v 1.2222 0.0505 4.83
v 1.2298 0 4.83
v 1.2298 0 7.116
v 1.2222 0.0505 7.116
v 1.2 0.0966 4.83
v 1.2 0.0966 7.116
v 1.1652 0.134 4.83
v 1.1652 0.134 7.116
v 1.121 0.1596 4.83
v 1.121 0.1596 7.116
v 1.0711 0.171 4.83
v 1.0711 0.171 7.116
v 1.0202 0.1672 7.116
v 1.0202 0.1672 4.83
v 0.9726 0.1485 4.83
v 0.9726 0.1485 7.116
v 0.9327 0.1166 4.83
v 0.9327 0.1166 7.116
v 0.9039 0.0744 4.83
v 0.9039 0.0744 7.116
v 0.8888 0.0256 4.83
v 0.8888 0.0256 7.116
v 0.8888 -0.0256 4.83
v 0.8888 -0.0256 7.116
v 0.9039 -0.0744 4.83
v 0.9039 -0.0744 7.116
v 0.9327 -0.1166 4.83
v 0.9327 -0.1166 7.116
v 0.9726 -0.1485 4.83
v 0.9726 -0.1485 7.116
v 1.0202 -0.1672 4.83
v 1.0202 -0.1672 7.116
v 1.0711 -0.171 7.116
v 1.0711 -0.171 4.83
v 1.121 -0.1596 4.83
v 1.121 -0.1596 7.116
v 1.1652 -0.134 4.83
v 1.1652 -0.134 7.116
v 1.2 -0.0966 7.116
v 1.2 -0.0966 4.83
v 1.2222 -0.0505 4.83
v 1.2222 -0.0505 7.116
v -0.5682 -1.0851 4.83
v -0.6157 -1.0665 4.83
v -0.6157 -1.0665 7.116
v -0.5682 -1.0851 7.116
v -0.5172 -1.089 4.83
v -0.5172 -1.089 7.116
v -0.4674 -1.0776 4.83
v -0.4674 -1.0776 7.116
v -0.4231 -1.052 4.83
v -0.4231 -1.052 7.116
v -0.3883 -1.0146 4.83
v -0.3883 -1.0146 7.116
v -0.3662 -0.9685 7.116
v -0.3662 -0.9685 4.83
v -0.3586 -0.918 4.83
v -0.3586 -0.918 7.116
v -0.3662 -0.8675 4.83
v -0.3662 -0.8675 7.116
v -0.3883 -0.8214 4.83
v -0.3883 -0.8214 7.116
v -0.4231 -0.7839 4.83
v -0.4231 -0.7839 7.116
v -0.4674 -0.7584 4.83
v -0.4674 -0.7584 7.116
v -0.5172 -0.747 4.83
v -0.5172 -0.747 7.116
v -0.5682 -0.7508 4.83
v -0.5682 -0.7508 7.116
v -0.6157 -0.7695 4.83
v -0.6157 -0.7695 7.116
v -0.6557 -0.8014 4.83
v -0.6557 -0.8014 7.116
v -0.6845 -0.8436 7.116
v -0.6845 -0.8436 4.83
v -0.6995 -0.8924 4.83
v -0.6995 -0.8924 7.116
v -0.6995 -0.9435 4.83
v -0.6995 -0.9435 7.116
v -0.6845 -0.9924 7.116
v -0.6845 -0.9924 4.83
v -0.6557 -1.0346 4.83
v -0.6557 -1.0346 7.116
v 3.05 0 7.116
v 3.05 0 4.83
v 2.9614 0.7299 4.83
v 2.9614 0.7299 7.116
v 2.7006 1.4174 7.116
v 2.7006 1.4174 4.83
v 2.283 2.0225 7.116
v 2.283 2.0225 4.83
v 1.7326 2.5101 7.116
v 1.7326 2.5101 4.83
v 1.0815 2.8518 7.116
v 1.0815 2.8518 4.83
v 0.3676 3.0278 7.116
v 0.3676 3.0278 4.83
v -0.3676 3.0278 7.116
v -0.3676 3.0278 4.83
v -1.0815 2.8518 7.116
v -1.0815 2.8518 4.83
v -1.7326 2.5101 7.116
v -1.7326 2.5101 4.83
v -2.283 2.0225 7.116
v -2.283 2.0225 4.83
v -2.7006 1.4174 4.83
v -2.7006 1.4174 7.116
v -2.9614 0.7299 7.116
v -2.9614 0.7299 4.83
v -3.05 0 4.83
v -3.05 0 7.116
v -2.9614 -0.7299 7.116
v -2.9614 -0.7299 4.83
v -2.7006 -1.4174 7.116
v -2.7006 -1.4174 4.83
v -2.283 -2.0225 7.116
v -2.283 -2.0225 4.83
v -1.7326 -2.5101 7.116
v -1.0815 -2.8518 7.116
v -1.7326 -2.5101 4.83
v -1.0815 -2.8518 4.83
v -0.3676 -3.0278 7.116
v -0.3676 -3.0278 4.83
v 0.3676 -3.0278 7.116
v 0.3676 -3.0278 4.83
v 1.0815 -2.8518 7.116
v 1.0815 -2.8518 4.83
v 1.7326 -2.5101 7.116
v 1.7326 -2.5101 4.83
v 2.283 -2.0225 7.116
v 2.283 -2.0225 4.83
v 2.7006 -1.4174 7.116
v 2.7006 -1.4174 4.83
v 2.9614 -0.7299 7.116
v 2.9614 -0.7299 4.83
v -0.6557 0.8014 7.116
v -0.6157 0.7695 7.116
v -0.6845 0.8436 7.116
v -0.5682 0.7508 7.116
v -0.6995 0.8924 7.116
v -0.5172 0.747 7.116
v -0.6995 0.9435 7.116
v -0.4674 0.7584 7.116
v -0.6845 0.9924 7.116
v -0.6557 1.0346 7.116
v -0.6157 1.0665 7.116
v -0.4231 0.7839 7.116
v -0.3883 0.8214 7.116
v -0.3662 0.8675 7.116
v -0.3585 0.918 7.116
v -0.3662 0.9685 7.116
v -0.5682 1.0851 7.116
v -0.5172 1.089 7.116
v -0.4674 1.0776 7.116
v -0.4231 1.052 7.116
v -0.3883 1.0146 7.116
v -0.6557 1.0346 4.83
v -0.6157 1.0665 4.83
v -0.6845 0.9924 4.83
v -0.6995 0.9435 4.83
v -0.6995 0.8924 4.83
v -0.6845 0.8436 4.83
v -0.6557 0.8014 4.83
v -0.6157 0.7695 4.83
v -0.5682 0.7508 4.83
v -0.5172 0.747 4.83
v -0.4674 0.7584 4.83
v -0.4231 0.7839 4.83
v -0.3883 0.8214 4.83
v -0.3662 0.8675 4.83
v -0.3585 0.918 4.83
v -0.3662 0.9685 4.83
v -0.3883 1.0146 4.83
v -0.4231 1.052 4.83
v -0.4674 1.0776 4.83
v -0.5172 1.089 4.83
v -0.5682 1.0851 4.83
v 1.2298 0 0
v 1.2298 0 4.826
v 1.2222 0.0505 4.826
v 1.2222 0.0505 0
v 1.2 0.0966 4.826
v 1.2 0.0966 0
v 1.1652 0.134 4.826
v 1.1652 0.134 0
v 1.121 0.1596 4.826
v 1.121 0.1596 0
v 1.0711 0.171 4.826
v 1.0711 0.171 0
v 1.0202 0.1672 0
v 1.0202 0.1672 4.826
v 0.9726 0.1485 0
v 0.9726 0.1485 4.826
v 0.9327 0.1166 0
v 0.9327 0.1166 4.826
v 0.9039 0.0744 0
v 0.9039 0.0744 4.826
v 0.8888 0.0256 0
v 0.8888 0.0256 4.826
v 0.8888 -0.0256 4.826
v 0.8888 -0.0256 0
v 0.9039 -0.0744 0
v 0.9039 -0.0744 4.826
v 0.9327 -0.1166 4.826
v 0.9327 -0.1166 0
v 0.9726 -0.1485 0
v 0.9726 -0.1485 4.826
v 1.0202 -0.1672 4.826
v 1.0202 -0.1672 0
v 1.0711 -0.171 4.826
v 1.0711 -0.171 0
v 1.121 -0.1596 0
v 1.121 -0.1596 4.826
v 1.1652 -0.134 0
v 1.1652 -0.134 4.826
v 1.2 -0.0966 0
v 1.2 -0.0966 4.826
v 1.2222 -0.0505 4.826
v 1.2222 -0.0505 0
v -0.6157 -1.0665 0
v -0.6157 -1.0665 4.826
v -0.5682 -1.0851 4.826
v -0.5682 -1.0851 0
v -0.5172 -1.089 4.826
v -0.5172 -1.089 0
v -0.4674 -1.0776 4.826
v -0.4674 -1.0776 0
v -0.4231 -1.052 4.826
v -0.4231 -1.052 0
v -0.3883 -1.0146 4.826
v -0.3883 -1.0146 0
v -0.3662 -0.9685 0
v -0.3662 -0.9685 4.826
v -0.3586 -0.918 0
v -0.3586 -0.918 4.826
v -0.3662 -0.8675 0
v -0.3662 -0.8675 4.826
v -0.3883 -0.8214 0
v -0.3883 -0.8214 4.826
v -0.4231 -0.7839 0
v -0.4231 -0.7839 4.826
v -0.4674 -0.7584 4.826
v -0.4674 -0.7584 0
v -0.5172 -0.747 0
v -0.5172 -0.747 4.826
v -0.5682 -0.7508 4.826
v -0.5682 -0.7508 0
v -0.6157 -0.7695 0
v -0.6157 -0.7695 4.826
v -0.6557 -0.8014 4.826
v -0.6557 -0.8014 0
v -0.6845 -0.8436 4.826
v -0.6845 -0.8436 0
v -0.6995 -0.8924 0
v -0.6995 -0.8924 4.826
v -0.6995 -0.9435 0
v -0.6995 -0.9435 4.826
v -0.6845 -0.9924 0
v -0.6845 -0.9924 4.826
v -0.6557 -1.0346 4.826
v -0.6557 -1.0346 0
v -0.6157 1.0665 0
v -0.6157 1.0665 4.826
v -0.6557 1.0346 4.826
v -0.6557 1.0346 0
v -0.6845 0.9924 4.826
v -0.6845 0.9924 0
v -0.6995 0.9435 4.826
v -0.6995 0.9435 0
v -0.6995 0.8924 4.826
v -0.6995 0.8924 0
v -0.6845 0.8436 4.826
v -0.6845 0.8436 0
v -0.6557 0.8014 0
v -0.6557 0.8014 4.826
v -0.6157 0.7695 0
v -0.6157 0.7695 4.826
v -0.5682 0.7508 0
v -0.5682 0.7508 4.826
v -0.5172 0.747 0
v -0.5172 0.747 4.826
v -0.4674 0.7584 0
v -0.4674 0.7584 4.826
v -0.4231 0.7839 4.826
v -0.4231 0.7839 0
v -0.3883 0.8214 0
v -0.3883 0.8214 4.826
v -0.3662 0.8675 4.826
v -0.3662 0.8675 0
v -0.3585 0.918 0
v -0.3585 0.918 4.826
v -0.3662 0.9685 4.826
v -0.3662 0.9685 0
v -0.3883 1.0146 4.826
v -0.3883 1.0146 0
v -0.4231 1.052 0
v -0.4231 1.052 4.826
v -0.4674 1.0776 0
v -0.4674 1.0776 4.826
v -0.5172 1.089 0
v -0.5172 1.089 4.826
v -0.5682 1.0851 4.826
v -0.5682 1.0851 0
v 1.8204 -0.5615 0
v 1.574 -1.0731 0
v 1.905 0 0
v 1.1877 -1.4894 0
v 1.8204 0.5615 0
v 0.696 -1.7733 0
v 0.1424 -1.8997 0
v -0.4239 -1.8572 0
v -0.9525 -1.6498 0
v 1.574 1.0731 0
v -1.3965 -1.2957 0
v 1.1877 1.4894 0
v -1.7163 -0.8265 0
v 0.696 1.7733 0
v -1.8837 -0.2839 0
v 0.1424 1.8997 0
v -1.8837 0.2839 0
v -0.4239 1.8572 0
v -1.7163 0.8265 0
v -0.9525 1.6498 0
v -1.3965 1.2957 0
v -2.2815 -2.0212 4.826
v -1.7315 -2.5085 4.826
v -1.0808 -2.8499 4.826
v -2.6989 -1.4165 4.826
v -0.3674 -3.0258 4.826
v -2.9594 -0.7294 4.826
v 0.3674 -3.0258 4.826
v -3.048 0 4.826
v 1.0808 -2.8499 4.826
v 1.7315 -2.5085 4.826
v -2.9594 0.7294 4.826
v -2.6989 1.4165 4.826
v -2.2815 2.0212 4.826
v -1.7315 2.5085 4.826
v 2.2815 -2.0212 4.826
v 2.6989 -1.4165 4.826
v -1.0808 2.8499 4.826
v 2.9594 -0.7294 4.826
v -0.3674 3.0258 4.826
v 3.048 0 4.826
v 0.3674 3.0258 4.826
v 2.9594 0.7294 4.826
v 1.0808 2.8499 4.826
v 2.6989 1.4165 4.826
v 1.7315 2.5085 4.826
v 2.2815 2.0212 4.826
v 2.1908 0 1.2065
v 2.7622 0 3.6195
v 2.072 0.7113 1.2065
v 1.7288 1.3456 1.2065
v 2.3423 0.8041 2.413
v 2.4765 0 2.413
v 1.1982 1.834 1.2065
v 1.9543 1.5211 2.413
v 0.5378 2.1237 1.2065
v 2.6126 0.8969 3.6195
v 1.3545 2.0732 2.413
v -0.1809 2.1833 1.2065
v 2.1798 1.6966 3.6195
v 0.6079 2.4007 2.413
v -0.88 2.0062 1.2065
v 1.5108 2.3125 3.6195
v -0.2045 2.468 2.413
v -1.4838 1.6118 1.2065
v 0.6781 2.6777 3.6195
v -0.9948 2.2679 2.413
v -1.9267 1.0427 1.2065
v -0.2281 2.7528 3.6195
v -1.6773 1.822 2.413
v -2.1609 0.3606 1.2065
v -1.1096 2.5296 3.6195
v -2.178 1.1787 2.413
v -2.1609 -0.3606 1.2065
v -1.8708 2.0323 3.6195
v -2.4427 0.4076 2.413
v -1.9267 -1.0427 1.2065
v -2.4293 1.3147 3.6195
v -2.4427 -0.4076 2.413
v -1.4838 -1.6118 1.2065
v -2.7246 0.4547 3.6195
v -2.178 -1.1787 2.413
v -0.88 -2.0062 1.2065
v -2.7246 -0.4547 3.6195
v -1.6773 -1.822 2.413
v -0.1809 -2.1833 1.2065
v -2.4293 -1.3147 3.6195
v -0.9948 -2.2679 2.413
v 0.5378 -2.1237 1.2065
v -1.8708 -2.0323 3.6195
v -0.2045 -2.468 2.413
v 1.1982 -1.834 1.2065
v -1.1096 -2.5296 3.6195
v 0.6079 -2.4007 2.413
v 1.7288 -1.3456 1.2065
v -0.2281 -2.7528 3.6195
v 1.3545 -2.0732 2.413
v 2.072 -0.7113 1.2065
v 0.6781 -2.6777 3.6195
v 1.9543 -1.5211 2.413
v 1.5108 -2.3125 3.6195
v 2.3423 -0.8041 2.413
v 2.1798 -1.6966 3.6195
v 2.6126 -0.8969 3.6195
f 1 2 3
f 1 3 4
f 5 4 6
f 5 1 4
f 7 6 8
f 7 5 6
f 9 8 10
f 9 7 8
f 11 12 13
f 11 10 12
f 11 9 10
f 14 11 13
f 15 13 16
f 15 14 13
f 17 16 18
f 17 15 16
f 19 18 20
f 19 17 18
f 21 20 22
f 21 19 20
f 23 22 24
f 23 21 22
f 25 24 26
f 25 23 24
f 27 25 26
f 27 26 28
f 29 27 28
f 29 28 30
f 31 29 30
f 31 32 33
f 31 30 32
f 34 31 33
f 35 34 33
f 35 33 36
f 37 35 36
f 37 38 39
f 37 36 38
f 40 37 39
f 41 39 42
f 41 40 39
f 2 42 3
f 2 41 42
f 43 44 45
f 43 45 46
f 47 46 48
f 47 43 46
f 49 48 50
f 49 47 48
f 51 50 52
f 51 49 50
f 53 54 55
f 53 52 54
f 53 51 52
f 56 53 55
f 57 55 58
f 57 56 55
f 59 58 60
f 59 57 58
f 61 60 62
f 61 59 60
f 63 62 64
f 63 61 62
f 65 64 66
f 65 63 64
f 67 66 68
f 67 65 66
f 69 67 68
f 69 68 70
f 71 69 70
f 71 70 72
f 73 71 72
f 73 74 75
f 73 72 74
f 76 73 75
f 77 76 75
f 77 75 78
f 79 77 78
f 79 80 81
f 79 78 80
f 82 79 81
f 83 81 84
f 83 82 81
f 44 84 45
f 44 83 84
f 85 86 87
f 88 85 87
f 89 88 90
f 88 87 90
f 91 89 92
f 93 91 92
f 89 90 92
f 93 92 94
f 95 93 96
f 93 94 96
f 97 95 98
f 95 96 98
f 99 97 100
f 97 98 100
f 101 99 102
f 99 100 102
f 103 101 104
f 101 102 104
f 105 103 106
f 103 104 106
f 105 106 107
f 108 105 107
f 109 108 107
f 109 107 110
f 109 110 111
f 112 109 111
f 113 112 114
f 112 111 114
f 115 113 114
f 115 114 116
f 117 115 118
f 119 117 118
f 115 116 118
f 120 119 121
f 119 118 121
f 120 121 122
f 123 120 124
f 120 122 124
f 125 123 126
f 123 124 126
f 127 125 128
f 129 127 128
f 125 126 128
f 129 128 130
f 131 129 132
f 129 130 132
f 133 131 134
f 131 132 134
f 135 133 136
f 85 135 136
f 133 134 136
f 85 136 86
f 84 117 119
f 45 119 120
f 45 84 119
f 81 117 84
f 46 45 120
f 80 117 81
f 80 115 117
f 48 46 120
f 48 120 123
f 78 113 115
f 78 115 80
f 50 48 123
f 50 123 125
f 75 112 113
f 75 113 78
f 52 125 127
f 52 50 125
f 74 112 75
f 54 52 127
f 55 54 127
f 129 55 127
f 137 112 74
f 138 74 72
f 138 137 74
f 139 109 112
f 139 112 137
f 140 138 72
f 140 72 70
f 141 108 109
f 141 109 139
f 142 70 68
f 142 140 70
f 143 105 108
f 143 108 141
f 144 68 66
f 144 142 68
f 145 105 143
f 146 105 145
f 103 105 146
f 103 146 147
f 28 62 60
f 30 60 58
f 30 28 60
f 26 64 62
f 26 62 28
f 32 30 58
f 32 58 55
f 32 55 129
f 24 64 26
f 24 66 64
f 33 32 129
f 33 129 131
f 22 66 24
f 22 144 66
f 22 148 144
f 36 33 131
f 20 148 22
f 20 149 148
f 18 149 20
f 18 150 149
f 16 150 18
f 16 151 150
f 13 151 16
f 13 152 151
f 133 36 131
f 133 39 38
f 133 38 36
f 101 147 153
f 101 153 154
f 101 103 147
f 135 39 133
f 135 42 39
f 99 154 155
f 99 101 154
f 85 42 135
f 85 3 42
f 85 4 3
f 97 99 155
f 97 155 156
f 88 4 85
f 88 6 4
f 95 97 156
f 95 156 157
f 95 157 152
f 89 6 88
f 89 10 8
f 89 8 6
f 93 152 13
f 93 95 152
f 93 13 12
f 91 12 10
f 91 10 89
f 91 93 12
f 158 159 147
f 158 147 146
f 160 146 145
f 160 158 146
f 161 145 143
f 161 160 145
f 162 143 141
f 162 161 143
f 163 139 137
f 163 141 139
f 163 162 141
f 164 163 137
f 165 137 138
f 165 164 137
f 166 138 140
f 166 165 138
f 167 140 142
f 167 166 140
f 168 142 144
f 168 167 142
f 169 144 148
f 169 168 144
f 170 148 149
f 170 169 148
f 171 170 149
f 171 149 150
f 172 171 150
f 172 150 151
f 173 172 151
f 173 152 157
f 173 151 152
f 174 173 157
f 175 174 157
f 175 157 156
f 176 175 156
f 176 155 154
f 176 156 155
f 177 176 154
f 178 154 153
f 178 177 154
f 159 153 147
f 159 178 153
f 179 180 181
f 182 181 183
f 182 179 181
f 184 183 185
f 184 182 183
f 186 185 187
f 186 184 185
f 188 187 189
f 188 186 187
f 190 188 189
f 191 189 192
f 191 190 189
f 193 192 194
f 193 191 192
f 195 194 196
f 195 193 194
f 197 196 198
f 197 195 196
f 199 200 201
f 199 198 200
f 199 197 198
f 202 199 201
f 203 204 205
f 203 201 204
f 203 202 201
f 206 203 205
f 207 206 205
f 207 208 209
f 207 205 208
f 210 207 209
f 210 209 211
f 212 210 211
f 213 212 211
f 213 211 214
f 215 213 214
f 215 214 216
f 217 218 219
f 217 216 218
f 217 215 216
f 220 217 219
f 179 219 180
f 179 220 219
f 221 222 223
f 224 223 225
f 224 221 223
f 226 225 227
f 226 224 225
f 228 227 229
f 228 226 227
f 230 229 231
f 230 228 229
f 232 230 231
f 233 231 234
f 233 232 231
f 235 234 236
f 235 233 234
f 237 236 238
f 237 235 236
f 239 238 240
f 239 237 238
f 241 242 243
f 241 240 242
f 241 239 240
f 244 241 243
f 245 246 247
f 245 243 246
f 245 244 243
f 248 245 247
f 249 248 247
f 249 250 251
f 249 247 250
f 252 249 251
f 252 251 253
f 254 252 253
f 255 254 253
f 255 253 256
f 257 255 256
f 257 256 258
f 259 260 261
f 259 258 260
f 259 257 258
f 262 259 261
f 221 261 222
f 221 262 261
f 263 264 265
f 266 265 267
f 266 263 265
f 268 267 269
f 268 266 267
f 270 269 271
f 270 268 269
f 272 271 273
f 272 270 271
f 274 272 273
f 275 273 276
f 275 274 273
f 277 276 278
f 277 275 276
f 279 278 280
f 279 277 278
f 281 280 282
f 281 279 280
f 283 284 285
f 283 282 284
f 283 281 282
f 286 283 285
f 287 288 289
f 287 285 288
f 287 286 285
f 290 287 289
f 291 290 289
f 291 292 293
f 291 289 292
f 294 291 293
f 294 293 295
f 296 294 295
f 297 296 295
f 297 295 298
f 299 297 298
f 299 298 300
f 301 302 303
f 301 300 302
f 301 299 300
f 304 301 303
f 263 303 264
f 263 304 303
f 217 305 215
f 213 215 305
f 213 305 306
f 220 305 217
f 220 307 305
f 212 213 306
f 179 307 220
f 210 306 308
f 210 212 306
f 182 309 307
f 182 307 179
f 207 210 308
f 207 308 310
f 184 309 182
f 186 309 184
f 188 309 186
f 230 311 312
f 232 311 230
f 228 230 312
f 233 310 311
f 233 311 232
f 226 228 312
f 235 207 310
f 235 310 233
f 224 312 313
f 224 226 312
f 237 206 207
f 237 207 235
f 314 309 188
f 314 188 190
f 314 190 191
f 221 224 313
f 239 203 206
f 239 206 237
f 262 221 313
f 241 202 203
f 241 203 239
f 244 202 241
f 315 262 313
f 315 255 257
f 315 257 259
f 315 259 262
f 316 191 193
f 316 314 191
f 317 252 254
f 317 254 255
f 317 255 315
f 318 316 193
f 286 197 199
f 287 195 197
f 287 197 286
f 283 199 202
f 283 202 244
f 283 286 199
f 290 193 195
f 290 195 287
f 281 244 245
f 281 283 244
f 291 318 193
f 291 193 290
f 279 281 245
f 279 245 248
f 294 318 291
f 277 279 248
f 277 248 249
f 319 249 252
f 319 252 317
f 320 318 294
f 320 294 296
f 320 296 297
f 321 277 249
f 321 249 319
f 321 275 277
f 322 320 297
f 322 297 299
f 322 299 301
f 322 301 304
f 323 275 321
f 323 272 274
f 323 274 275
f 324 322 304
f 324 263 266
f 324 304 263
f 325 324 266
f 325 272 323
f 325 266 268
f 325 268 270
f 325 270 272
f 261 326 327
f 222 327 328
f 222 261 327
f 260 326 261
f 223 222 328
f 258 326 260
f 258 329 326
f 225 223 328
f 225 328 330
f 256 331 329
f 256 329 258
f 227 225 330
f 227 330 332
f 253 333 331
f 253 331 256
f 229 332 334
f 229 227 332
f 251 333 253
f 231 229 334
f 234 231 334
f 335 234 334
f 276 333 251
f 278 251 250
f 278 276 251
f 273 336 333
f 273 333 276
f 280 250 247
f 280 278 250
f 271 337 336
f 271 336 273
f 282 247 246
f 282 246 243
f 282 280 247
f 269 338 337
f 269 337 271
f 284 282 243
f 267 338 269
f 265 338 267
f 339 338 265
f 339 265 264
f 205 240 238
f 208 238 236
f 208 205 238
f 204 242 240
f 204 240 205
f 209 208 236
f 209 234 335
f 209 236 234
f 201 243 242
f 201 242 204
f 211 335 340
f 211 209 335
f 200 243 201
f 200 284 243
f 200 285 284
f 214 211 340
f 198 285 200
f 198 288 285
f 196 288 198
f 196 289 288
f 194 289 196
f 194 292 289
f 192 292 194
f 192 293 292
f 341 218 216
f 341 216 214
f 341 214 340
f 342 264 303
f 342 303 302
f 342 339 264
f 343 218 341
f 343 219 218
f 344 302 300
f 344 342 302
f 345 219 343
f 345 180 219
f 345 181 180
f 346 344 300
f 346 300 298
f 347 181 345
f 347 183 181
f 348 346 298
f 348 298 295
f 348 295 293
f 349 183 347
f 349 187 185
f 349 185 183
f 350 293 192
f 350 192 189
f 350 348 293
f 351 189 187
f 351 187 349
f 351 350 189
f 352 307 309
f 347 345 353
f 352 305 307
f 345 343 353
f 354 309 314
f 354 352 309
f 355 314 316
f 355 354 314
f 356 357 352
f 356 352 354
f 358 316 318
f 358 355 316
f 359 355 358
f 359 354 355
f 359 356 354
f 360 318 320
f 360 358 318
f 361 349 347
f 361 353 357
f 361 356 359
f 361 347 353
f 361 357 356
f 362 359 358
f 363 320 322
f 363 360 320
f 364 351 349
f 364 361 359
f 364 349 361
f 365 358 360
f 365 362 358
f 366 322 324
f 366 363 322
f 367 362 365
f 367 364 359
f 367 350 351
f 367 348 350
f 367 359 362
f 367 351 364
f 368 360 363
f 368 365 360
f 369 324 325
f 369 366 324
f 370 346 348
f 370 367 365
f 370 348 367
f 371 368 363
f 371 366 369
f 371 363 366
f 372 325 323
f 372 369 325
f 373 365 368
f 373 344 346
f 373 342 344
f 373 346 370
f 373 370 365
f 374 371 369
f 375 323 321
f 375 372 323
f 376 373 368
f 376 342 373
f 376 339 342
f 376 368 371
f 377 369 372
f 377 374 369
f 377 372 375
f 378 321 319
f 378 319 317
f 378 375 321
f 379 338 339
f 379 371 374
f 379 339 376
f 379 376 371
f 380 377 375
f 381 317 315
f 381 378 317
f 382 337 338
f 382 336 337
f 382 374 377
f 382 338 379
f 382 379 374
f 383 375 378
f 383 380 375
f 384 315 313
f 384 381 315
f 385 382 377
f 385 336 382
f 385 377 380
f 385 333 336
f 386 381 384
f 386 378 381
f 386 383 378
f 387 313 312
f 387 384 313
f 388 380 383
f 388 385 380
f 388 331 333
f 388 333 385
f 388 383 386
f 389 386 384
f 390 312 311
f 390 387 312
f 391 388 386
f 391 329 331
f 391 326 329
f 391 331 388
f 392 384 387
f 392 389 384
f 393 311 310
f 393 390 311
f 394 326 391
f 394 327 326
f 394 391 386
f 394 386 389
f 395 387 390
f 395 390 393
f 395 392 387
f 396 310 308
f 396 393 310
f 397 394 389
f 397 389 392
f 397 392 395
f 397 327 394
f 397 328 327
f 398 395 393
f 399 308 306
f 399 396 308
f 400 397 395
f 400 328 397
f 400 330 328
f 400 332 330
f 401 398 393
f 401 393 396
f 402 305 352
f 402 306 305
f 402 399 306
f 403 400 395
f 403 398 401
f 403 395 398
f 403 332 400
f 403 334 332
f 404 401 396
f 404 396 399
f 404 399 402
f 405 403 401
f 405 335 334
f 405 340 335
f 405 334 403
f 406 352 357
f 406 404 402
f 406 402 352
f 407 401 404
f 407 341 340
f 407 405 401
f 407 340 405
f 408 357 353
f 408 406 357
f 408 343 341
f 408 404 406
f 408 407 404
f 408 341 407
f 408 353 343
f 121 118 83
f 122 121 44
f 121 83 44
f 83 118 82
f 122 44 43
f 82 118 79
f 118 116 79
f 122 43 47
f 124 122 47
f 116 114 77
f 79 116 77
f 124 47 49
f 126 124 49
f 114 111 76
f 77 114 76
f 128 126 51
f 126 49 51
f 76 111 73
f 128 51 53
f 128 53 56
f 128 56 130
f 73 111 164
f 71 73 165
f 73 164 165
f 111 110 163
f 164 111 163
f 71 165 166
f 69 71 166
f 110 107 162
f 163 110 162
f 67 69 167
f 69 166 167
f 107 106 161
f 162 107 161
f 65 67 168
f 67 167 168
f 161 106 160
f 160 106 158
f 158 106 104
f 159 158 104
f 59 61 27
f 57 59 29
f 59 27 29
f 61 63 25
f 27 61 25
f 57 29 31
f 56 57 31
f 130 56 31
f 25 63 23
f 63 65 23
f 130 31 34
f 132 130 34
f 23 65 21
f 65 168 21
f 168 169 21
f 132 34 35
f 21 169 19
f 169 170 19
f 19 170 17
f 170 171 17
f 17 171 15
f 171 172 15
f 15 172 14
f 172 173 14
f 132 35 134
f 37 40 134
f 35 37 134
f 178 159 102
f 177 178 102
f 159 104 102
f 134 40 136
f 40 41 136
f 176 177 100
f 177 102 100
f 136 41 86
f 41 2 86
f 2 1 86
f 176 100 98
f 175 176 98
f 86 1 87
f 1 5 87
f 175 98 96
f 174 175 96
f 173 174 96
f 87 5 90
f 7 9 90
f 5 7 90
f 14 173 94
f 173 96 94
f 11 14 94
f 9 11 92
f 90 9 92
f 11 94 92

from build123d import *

# Parameters (mm, degrees)
CYLINDER003_R               = 0.17145
CYLINDER003_DEPTH           = 7.12
COMPOUND_PLACEMENT_ANGLE    = 120
CYLINDER002_R               = 0.17145
CYLINDER002_DEPTH           = 7.12
COMPOUND001_PLACEMENT_ANGLE = 240
CYLINDER001_R               = 0.17145
CYLINDER001_DEPTH           = 7.12
CYLINDER_R                  = 3.05
CYLINDER_DEPTH              = 2.286


with BuildPart() as compound:
    # Cylinder003 → Cylinder003 (new body)
    with BuildSketch(Plane(origin=(1.06, 0, 0), x_dir=(1, 0, 0), z_dir=(0, 0, 1))):
        Circle(CYLINDER003_R)
    extrude(amount=CYLINDER003_DEPTH)


with BuildPart() as compound_1:
    # Compound placement: moved
    add(compound.part.rotate(Axis((0, 0, 0), (0, 0, 1)), COMPOUND_PLACEMENT_ANGLE))


with BuildPart() as compound001:
    # Cylinder002 → Cylinder002 (new body)
    with BuildSketch(Plane(origin=(1.06, 0, 0), x_dir=(1, 0, 0), z_dir=(0, 0, 1))):
        Circle(CYLINDER002_R)
    extrude(amount=CYLINDER002_DEPTH)


with BuildPart() as compound001_1:
    # Compound001 placement: moved
    add(compound001.part.rotate(Axis((0, 0, 0), (0, 0, 1)), COMPOUND001_PLACEMENT_ANGLE))


with BuildPart() as fibers:
    # Cylinder001 → Cylinder001 (new body)
    with BuildSketch(Plane(origin=(1.058333, 0, 0), x_dir=(1, 0, 0), z_dir=(0, 0, 1))):
        Circle(CYLINDER001_R)
    extrude(amount=CYLINDER001_DEPTH)

    # Fusion001: union Compound, Compound001
    add(compound_1.part)
    add(compound001_1.part)


with BuildPart() as cylinder:
    # Cylinder → Cylinder (new body)
    with BuildSketch(Plane.XY.offset(4.83)):
        Circle(CYLINDER_R)
    extrude(amount=CYLINDER_DEPTH)


with BuildPart() as swagelokfiberferruletripple0_125in:
    # Cone → Cone (revolve)
    with BuildSketch(Plane.XZ):
        Polygon((0, 0), (1.905, 0), (3.048, 4.826), (0, 4.826), align=None)
    revolve(axis=Axis((0, 0, 0), (0, 0, 1)))

    # Fusion: union Cylinder
    add(cylinder.part)

    # Cut: cut Fibers
    add(fibers.part, mode=Mode.SUBTRACT)


solid = swagelokfiberferruletripple0_125in.part
